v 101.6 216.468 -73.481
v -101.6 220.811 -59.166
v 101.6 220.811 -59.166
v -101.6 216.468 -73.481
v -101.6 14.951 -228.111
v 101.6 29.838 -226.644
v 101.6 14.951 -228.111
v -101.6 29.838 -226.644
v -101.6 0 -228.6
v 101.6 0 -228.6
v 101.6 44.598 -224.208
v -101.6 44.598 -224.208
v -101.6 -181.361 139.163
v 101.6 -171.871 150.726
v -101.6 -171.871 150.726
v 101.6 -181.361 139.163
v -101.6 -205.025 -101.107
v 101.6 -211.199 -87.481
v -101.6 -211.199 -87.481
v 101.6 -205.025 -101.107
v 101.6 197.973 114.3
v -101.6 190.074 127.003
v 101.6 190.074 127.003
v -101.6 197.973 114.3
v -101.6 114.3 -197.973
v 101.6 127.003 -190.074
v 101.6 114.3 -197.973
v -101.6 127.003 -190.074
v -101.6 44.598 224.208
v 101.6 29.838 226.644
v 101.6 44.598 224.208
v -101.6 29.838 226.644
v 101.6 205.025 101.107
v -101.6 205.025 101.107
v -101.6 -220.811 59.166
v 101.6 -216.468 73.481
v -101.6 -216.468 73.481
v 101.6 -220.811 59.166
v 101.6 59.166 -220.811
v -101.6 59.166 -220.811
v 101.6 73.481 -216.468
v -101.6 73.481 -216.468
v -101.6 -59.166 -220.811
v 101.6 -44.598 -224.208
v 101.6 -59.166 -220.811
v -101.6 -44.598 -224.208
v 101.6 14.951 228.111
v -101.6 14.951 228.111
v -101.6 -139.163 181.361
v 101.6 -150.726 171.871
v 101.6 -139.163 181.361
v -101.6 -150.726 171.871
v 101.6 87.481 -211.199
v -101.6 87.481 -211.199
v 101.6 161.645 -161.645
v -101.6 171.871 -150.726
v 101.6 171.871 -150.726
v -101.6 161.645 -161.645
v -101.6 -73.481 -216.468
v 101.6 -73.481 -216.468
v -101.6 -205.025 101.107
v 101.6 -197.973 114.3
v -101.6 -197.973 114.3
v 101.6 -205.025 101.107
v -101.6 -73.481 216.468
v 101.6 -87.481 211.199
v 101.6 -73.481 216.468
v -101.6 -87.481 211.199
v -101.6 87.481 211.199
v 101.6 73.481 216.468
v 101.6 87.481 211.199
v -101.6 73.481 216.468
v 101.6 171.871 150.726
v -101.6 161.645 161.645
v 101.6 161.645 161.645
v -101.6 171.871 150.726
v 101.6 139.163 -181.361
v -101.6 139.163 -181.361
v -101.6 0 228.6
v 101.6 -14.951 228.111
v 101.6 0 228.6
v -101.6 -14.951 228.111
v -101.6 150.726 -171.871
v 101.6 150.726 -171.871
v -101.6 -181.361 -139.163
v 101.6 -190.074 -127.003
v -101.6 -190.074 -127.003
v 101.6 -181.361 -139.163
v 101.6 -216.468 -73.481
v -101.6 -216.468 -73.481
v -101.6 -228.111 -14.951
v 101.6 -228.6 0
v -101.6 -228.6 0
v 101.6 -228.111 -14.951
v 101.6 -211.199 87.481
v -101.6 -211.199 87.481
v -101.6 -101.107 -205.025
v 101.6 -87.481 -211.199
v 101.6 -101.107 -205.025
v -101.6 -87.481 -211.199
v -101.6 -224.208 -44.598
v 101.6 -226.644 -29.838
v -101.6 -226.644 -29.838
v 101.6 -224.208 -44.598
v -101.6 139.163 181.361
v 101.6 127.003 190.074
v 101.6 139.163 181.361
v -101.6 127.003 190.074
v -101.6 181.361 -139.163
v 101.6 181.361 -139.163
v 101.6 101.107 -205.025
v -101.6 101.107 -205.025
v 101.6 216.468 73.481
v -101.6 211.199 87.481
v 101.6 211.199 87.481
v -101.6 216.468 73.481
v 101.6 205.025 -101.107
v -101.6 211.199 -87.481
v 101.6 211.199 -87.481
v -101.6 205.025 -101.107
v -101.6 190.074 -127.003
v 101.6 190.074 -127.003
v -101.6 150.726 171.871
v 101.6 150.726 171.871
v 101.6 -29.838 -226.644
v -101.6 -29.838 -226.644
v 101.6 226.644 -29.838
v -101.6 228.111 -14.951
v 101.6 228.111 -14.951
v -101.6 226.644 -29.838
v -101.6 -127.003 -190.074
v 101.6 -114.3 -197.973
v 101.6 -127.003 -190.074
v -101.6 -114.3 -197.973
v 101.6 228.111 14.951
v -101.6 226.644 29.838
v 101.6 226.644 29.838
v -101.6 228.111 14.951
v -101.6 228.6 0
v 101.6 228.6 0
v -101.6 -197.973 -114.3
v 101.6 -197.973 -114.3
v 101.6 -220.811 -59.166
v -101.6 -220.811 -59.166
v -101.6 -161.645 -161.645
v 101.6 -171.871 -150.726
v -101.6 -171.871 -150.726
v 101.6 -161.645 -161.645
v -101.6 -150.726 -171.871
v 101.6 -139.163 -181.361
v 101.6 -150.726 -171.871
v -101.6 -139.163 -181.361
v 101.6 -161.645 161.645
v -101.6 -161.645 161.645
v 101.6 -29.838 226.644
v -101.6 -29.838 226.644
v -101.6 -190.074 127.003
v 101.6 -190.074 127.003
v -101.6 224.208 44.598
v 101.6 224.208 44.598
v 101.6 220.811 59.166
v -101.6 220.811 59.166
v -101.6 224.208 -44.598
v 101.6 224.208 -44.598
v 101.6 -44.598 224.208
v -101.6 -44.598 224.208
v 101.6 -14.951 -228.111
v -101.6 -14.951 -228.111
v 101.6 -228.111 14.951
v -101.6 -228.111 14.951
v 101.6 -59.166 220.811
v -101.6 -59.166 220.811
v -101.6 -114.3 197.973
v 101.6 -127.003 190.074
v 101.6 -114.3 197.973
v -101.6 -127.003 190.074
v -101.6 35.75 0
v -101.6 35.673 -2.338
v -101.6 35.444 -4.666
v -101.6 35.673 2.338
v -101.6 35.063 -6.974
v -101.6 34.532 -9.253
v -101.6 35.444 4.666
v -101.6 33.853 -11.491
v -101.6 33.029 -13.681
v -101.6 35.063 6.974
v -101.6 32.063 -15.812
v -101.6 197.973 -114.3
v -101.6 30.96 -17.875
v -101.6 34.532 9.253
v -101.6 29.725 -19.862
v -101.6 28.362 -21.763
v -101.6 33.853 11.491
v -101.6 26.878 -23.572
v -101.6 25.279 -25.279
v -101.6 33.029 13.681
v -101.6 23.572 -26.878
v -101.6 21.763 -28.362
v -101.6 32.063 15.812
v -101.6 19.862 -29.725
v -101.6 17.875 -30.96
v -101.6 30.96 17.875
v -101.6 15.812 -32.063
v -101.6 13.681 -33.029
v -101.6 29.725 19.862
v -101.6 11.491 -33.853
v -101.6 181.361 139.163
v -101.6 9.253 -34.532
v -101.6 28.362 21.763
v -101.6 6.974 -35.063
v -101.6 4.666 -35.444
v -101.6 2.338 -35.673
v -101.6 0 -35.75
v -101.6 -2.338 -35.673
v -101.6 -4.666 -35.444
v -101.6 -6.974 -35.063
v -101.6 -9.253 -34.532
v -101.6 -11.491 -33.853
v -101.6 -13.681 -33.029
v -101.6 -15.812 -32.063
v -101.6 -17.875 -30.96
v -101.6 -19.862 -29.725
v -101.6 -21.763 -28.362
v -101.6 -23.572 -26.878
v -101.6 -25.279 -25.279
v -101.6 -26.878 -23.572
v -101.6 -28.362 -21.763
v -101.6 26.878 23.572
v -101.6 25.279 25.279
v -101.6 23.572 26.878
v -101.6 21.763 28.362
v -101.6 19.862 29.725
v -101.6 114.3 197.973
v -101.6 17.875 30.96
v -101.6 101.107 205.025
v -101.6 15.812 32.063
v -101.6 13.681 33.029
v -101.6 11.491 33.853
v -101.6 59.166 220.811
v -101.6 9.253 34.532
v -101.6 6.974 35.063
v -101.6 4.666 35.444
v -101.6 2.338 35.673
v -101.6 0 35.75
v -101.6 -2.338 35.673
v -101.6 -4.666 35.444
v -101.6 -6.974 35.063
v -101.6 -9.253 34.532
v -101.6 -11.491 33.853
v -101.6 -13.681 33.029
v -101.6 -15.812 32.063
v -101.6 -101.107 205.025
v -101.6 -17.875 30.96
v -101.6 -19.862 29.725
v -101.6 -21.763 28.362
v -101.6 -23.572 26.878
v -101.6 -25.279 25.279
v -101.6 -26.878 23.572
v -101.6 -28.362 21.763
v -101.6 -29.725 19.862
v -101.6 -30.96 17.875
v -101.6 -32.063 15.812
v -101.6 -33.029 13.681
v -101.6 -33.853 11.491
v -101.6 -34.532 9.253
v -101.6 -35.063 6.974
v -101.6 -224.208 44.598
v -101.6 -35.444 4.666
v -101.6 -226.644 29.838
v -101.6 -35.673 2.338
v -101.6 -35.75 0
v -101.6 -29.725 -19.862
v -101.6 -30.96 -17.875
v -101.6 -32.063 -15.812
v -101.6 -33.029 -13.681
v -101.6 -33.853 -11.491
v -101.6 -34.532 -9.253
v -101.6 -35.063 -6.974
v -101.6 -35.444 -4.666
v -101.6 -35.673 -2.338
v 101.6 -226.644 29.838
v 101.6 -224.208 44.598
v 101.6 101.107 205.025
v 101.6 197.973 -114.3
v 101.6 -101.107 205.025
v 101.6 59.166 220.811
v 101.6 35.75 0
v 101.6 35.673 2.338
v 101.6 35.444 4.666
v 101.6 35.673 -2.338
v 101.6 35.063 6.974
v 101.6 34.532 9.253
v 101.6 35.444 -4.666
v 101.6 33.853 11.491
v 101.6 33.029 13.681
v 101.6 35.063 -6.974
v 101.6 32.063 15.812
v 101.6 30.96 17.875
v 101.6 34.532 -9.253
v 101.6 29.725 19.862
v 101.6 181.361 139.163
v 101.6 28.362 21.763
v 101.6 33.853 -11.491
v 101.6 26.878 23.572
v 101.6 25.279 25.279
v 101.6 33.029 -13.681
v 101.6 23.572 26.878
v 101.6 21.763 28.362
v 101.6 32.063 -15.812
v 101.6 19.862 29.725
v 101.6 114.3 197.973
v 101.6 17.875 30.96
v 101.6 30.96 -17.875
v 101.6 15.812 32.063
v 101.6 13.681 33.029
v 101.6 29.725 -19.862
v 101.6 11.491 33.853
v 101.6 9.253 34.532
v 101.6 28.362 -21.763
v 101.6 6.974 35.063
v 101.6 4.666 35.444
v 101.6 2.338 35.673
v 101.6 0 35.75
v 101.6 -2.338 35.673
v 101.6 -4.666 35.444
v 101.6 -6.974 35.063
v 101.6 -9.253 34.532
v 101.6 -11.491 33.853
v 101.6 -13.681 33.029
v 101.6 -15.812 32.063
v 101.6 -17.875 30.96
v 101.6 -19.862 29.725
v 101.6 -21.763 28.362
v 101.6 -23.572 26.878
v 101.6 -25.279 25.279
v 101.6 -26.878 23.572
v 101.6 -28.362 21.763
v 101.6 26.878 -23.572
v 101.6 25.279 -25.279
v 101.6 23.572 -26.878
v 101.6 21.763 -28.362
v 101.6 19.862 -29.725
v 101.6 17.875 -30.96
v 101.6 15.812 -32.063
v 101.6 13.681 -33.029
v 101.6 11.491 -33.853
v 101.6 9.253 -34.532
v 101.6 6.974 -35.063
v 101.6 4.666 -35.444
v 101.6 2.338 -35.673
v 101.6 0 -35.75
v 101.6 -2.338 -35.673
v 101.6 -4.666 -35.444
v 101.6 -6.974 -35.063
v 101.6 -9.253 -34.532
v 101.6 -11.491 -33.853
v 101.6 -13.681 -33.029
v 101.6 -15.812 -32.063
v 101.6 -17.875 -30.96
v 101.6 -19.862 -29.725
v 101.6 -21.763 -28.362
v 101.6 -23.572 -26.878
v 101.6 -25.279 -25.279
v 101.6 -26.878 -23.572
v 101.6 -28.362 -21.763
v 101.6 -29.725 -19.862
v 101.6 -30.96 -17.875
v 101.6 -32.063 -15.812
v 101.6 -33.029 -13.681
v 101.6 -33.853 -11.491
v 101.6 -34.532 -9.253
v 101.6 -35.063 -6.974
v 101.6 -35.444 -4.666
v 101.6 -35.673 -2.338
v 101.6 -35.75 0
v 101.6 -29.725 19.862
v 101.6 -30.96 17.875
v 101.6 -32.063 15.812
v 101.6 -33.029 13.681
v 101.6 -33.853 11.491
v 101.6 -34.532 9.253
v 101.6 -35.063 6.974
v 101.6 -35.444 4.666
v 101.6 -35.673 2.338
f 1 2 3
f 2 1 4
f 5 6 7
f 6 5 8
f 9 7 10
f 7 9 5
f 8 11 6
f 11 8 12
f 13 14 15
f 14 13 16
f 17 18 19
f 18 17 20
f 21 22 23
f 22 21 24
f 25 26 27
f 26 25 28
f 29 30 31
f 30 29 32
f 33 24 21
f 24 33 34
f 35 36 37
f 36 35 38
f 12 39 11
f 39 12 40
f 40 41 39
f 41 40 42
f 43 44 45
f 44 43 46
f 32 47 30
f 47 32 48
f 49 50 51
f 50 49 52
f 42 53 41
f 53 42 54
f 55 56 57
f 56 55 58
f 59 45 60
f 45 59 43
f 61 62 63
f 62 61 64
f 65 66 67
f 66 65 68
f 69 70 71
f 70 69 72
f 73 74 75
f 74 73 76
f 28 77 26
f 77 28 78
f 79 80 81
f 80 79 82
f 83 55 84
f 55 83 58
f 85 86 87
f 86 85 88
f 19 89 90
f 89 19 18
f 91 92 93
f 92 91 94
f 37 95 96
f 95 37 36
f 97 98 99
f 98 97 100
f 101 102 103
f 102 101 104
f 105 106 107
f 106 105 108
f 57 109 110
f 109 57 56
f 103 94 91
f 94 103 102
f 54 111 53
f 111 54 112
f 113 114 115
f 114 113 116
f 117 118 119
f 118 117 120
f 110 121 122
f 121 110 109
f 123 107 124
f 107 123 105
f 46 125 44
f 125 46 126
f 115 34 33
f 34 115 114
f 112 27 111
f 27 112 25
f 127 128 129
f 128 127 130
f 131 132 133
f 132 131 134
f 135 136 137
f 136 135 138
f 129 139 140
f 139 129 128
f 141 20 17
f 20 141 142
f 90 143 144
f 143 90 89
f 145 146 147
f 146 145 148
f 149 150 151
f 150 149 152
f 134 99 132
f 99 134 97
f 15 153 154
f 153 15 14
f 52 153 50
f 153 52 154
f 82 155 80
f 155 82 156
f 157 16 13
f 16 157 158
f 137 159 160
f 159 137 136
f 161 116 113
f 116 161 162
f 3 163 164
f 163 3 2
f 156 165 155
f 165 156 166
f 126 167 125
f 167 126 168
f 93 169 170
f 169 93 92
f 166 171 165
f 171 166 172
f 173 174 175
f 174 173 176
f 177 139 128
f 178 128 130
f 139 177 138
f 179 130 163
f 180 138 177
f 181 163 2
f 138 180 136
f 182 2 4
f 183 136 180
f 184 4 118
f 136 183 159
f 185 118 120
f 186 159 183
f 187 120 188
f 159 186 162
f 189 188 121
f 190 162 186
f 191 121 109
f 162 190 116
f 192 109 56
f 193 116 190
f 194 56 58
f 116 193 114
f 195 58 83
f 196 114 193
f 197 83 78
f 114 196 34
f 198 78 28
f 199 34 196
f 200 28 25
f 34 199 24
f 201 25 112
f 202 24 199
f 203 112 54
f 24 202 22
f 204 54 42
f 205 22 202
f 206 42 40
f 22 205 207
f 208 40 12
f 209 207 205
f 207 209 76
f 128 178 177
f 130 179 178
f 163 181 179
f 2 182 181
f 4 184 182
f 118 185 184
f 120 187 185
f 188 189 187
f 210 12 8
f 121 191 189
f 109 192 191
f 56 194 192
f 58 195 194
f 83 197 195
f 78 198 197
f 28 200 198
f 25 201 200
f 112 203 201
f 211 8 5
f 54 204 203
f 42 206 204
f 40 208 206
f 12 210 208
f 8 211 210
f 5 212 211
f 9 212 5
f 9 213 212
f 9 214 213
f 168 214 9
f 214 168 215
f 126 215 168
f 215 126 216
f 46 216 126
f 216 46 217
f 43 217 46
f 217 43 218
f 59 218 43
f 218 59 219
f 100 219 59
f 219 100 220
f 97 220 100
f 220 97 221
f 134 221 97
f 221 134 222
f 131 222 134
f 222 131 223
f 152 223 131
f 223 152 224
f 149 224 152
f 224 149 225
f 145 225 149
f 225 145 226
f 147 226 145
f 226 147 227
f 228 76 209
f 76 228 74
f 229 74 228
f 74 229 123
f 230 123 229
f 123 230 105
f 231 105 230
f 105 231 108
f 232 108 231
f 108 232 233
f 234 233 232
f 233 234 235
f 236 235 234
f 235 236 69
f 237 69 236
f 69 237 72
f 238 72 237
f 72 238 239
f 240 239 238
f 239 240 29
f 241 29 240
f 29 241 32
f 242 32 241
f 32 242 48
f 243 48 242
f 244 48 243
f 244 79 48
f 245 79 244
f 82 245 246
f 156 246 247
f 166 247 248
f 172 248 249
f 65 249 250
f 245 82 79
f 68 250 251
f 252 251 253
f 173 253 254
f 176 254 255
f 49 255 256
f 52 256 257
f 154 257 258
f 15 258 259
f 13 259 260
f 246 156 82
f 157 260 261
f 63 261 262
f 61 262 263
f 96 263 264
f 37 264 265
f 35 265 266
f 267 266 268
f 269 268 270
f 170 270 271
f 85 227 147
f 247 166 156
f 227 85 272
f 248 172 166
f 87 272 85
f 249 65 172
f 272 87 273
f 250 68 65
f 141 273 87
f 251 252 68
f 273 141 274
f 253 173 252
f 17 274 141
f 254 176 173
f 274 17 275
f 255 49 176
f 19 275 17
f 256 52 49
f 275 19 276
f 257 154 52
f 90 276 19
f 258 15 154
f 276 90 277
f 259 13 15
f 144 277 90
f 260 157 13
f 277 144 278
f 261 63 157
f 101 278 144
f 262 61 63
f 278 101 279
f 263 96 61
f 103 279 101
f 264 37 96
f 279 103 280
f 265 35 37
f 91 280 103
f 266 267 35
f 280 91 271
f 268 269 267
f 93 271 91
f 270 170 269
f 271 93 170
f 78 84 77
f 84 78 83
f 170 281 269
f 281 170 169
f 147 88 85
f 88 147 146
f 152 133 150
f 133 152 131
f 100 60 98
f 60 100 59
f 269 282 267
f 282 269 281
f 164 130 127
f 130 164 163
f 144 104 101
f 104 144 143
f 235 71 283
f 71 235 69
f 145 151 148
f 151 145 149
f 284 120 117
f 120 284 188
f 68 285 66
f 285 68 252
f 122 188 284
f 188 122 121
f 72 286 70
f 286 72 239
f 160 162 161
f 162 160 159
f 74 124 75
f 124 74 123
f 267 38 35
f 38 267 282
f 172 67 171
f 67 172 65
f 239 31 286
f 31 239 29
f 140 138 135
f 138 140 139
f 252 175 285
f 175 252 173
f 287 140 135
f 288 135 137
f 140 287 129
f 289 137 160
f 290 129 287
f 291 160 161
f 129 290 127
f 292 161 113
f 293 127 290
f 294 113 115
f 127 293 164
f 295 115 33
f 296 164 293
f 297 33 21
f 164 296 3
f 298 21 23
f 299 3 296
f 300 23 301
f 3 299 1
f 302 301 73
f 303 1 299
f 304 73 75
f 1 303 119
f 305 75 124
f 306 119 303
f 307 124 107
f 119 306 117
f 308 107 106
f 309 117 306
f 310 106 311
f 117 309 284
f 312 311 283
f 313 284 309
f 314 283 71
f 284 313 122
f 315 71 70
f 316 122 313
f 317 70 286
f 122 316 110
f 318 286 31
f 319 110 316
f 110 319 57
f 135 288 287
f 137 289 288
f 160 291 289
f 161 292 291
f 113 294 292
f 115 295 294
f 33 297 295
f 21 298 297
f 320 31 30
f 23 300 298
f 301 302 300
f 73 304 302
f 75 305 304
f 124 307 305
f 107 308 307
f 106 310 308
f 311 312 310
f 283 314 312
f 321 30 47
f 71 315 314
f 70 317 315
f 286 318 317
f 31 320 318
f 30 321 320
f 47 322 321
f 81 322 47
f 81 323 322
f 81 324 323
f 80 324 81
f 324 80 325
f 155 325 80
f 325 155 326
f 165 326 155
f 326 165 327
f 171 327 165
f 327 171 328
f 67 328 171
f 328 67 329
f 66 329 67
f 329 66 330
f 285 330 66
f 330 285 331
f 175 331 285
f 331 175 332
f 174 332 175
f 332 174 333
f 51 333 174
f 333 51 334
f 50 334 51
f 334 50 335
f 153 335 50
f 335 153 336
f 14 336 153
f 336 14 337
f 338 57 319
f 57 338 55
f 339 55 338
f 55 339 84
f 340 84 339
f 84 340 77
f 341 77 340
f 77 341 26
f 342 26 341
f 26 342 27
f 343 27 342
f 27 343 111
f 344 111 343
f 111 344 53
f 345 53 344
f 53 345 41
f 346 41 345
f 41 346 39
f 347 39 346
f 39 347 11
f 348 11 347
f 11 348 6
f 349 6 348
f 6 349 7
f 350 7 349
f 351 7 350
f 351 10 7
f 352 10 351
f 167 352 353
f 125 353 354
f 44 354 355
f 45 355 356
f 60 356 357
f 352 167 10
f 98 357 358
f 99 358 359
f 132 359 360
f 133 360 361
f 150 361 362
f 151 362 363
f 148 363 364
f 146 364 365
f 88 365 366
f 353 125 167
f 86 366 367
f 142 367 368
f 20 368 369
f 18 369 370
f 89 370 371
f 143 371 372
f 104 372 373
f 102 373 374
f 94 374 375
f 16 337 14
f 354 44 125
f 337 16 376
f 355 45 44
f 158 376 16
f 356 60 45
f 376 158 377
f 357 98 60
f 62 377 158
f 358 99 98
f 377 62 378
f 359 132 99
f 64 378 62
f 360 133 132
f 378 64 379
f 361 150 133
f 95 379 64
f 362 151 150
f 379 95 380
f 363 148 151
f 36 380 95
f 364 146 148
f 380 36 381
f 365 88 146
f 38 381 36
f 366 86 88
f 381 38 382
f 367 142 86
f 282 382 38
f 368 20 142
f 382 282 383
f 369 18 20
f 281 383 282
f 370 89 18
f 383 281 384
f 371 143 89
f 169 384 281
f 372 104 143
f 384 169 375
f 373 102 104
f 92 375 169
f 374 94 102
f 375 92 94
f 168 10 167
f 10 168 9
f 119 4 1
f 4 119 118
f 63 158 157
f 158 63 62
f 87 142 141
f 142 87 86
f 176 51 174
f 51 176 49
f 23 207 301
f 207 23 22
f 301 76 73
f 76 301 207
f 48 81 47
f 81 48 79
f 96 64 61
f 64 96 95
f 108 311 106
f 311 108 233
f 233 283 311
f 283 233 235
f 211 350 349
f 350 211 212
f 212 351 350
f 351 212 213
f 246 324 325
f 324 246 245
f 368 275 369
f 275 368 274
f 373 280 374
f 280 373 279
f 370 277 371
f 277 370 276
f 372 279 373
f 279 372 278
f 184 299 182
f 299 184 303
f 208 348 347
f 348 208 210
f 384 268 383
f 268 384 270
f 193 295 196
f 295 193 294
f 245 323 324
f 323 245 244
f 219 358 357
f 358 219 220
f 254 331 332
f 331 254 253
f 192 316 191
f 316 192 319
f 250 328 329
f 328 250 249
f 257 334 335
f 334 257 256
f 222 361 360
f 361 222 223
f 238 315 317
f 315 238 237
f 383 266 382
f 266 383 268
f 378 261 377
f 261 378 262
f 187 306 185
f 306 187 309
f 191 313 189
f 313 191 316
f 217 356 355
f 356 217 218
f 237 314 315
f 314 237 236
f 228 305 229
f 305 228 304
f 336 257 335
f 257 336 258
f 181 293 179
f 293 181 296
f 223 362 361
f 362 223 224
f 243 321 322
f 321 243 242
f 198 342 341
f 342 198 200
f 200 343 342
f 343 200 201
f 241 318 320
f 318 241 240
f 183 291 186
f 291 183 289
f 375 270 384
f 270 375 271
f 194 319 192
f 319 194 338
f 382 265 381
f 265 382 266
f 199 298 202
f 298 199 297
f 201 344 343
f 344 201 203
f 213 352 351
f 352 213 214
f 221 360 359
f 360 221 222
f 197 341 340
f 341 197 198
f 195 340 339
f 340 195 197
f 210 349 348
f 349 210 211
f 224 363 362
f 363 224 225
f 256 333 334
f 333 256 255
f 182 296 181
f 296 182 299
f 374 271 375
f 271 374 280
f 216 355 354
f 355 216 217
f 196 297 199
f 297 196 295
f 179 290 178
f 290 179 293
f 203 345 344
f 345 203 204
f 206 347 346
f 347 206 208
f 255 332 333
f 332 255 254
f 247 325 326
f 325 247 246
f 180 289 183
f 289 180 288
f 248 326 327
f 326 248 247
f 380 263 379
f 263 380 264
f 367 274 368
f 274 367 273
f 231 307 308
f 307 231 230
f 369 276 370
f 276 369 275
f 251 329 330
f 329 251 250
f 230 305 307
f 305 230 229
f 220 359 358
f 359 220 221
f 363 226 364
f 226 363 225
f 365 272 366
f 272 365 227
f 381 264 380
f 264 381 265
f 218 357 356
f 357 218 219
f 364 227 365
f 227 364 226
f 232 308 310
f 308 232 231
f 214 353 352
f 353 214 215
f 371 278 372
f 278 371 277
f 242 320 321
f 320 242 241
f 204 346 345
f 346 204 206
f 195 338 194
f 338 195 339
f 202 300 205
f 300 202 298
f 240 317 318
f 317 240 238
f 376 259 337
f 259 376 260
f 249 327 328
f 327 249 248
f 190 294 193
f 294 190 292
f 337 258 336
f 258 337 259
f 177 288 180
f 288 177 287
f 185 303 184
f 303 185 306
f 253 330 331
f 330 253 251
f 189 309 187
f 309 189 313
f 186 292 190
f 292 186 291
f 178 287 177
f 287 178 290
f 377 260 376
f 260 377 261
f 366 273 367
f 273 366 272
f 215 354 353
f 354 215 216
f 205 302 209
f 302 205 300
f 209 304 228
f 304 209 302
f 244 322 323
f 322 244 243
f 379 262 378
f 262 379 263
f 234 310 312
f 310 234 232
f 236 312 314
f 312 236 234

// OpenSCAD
// Generated documentary F1 envelope proxy.
// Not manufacturing geometry, not dimensionally validated, not SimReady.
proxy_id = "COMP-FUCHS-37027.011";
$fn = 96;

rim_diameter_mm = 457.2;
rim_width_mm = 203.2;
centre_bore_mm = 71.5;

rotate([0, 90, 0])
difference() {
    cylinder(h = rim_width_mm, d = rim_diameter_mm, center = true);
    cylinder(h = rim_width_mm + 2, d = centre_bore_mm, center = true);
}
